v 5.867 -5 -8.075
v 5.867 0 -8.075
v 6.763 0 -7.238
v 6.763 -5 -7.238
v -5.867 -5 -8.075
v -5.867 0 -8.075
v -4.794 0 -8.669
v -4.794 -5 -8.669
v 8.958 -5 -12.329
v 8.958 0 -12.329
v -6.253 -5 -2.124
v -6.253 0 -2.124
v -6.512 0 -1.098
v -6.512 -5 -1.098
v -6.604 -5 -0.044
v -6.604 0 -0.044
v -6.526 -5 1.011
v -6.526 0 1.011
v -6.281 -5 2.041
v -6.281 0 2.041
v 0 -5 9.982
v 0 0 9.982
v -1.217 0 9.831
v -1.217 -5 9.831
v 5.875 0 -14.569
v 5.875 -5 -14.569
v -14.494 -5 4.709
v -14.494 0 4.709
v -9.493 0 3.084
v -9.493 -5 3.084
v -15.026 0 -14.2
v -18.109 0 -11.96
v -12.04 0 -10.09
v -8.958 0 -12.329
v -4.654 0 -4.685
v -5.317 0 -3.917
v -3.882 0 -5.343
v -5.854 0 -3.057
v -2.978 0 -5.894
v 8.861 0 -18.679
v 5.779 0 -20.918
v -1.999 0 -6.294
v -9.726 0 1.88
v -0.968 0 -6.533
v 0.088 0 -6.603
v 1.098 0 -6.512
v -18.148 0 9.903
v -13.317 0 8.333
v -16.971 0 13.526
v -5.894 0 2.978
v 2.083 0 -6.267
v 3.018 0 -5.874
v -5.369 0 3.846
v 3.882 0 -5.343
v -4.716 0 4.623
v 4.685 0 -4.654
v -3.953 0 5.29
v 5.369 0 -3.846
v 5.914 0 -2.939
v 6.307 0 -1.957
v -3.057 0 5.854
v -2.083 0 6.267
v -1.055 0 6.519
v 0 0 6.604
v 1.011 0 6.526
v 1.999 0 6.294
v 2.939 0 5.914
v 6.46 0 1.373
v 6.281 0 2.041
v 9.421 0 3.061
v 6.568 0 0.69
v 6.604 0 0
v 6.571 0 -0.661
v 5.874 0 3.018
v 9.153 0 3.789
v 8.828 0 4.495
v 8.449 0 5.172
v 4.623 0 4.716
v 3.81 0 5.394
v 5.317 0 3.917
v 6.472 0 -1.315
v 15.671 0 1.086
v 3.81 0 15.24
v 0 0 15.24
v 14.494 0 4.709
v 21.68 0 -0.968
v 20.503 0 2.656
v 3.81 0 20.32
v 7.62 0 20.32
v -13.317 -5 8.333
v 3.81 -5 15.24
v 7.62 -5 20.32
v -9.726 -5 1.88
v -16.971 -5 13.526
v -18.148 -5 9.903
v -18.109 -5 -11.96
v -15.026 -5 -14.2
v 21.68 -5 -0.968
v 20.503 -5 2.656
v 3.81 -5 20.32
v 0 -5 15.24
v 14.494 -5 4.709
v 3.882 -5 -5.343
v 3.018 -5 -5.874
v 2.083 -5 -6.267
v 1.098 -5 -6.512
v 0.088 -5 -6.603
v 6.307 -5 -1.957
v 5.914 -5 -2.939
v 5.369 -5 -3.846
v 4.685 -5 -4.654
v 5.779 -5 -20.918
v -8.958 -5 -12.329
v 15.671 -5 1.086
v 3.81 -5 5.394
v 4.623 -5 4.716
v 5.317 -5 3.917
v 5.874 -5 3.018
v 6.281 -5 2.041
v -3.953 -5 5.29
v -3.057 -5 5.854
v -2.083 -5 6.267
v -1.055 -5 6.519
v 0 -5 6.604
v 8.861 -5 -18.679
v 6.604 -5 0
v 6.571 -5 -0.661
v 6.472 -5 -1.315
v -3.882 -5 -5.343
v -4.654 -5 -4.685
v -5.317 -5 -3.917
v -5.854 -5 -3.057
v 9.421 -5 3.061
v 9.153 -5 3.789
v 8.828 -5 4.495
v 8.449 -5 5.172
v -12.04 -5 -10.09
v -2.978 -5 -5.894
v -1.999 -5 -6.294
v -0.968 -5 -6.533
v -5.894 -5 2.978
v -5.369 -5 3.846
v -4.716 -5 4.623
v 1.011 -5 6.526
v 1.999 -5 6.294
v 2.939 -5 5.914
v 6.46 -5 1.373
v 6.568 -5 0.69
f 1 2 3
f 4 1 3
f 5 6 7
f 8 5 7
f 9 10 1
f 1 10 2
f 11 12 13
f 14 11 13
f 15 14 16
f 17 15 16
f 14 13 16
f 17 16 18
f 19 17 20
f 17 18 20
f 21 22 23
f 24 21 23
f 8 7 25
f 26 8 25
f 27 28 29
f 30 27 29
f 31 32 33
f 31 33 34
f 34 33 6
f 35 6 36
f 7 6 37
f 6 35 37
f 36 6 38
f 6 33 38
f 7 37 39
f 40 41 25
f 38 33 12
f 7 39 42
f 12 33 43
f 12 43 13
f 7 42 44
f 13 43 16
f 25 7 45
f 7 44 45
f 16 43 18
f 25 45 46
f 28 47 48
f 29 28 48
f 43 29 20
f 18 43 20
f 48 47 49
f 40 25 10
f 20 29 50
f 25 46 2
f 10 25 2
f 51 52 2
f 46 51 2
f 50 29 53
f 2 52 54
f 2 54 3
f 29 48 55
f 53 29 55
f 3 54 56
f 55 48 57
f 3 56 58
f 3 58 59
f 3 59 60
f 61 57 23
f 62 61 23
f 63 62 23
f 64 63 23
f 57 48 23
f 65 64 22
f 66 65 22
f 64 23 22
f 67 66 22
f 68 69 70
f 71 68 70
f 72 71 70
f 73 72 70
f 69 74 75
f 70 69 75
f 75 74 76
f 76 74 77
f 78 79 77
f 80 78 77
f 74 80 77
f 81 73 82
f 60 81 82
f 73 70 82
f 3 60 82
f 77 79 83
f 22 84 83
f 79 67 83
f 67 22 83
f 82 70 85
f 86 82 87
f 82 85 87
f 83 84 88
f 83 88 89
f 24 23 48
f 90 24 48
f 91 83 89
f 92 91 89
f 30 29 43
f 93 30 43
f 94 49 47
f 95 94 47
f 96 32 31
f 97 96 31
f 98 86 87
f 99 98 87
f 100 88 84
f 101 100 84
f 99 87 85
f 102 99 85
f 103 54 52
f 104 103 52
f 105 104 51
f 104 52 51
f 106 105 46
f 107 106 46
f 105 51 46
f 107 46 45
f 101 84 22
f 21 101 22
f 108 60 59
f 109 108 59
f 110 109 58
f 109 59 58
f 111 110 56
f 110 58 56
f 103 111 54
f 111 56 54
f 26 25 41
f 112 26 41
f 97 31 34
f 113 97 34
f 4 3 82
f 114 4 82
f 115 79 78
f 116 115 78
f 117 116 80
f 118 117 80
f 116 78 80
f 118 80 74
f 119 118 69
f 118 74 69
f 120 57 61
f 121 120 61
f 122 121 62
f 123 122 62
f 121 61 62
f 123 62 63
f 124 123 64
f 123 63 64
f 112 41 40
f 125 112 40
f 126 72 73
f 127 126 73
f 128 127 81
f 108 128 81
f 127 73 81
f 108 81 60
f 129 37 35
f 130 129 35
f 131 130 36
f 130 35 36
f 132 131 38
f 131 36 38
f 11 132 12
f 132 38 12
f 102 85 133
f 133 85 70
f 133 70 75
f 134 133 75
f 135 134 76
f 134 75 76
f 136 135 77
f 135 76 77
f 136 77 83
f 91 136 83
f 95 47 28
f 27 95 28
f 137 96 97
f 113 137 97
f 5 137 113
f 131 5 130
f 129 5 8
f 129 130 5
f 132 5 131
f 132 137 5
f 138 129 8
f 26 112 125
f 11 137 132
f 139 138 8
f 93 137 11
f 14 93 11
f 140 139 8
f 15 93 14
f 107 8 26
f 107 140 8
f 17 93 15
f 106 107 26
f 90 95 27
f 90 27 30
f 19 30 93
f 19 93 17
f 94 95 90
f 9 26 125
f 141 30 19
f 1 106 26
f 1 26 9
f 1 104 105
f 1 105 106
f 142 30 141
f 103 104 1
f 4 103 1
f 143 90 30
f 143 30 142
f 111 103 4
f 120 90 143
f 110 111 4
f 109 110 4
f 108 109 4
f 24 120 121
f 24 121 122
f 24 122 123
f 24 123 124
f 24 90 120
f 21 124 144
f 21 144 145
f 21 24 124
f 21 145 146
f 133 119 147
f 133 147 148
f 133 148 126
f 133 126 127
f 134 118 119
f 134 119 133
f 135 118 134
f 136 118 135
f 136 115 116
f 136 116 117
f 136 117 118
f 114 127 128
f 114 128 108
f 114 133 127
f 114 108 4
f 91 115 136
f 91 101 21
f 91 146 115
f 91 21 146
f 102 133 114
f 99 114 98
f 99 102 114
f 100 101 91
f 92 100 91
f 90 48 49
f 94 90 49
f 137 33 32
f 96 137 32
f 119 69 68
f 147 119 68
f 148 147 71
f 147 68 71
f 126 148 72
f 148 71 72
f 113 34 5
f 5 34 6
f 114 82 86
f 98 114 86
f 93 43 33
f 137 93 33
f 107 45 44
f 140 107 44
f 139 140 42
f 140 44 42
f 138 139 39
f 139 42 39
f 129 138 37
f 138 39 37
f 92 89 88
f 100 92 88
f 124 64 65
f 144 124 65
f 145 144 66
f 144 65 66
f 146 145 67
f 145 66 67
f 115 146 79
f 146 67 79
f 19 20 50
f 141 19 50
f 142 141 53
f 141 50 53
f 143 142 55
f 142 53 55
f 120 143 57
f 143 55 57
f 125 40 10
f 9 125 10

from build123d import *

# Parameters (mm, degrees)
F1_DEPTH = 5


with BuildPart() as f1:
    # F0 (on Front) → F1 (new body)
    with BuildSketch(Plane.XZ):
        with BuildLine():
            ThreePointArc((6.2807772336, 2.0407482309), (6.5226938013, 1.0330932071), (6.604, 0))
            ThreePointArc((6.604, 0), (6.5294502373, -0.9894925964), (6.3074840707, -1.9566452661))
            Line((6.3074840707, -1.9566452661), (9.8738155336, -0.7978739305))
            ThreePointArc((9.8738155336, -0.7978739305), (9.897950613, -0.3992613959), (9.906, 0))
            ThreePointArc((9.906, 0), (9.7840407019, 1.5496398107), (9.4211658504, 3.0611223463))
            Line((9.4211658504, 3.0611223463), (6.2807772336, 2.0407482309))
        make_face()
        with BuildLine():
            ThreePointArc((3.81, 5.3941371877), (5.3166954651, 3.9173416154), (6.2807772336, 2.0407482309))
            Line((6.2807772336, 2.0407482309), (9.4211658504, 3.0611223463))
            Line((9.4211658504, 3.0611223463), (8.4486177468, 5.1720106505))
            ThreePointArc((8.4486177468, 5.1720106505), (6.4430274028, 7.5243759799), (3.81, 9.144))
            Line((3.81, 9.144), (3.81, 5.3941371877))
        make_face()
        with BuildLine():
            Line((9.8738155336, -0.7978739305), (6.3074840707, -1.9566452661))
            ThreePointArc((6.3074840707, -1.9566452661), (5.3685625225, -3.8459527353), (3.8817338061, -5.3427482309))
            Line((3.8817338061, -5.3427482309), (5.8226007092, -8.0141223463))
            ThreePointArc((5.8226007092, -8.0141223463), (6.3048332162, -7.6405440981), (6.763157516, -7.2379925679))
            ThreePointArc((6.763157516, -7.2379925679), (8.9199775829, -4.3084609689), (9.8738155336, -0.7978739305))
        make_face()
        with BuildLine():
            Line((14.4941013083, 4.7094189943), (9.4211658504, 3.0611223463))
            ThreePointArc((9.4211658504, 3.0611223463), (9.7840407019, 1.5496398107), (9.906, 0))
            ThreePointArc((9.906, 0), (9.897950613, -0.3992613959), (9.8738155336, -0.7978739305))
            Line((9.8738155336, -0.7978739305), (15.6714560569, 1.0858936672))
            Line((15.6714560569, 1.0858936672), (14.4941013083, 4.7094189943))
        make_face()
        with BuildLine():
            Line((8.4486177468, 5.1720106505), (9.4211658504, 3.0611223463))
            ThreePointArc((9.4211658504, 3.0611223463), (8.9970136051, 4.1451878352), (8.4486177468, 5.1720106505))
        make_face()
        with BuildLine():
            Line((15.6714560569, 1.0858936672), (9.8738155336, -0.7978739305))
            ThreePointArc((9.8738155336, -0.7978739305), (8.9199775829, -4.3084609689), (6.763157516, -7.2379925679))
            Line((6.763157516, -7.2379925679), (15.6714560569, 1.0858936672))
        make_face()
        with BuildLine():
            ThreePointArc((-3.9527745736, 5.2904053881), (-2.0826640172, 6.2670029992), (0, 6.604))
            Line((0, 6.604), (0, 9.906))
            ThreePointArc((0, 9.906), (-0.6097179629, 9.8872180114), (-1.2171238492, 9.8309432679))
            ThreePointArc((-1.2171238492, 9.8309432679), (-4.6839635346, 8.7286494721), (-7.5191060364, 6.4491767236))
            Line((-7.5191060364, 6.4491767236), (-3.9527745736, 5.2904053881))
        make_face()
        with BuildLine():
            Line((3.81, 15.24), (3.81, 9.144))
            ThreePointArc((3.81, 9.144), (6.4430274028, 7.5243759799), (8.4486177468, 5.1720106505))
            Line((8.4486177468, 5.1720106505), (3.81, 15.24))
        make_face()
        with BuildLine():
            ThreePointArc((0, 9.906), (1.9427264347, 9.7136321734), (3.81, 9.144))
            Line((3.81, 9.144), (3.81, 15.24))
            Line((3.81, 15.24), (0, 15.24))
            Line((0, 15.24), (0, 9.9816298047))
            Line((0, 9.9816298047), (0, 9.906))
        make_face()
        Polygon((20.5028231597, 2.6556999986), (14.4941013083, 4.7094189943), (15.6714560569, 1.0858936672), (21.6801779083, -0.9678253285), align=None)
        with BuildLine():
            Line((2.2923535984, -9.6371132078), (0.0882395392, -6.6034104661))
            ThreePointArc((0.0882395392, -6.6034104661), (-1.9987413555, -6.2942711249), (-3.8817338061, -5.3427482309))
            Line((-3.8817338061, -5.3427482309), (-5.8226007092, -8.0141223463))
            ThreePointArc((-5.8226007092, -8.0141223463), (-5.3182886736, -8.3573106669), (-4.793809454, -8.6688076988))
            ThreePointArc((-4.793809454, -8.6688076988), (-1.3411652542, -9.8147904593), (2.2923535984, -9.6371132078))
        make_face()
        with BuildLine():
            Line((5.8670547931, -8.0753081436), (5.8226007092, -8.0141223463))
            ThreePointArc((5.8226007092, -8.0141223463), (4.1378310366, -9.0003994529), (2.2923535984, -9.6371132078))
            Line((2.2923535984, -9.6371132078), (5.8754924964, -14.5688808055))
            Line((5.8754924964, -14.5688808055), (8.9578472449, -12.3294189943))
            Line((8.9578472449, -12.3294189943), (5.8670547931, -8.0753081436))
        make_face()
        with BuildLine():
            ThreePointArc((6.763157516, -7.2379925679), (6.3048332162, -7.6405440981), (5.8226007092, -8.0141223463))
            Line((5.8226007092, -8.0141223463), (5.8670547931, -8.0753081436))
            Line((5.8670547931, -8.0753081436), (6.763157516, -7.2379925679))
        make_face()
        with BuildLine():
            ThreePointArc((-1.2171238492, 9.8309432679), (-0.6097179629, 9.8872180114), (0, 9.906))
            Line((0, 9.906), (0, 9.9816298047))
            Line((0, 9.9816298047), (-1.2171238492, 9.8309432679))
        make_face()
        Polygon((3.81, 20.32), (3.81, 15.24), (7.62, 20.32), align=None)
        Polygon((0, 15.24), (3.81, 15.24), (3.81, 20.32), align=None)
        with BuildLine():
            Line((5.8754924964, -14.5688808055), (2.2923535984, -9.6371132078))
            ThreePointArc((2.2923535984, -9.6371132078), (-1.3411652542, -9.8147904593), (-4.793809454, -8.6688076988))
            Line((-4.793809454, -8.6688076988), (5.8754924964, -14.5688808055))
        make_face()
        with BuildLine():
            ThreePointArc((-6.2529490364, -2.1244868436), (-6.6038526149, -0.0441207543), (-6.2807772336, 2.0407482309))
            Line((-6.2807772336, 2.0407482309), (-9.4211658504, 3.0611223463))
            ThreePointArc((-9.4211658504, 3.0611223463), (-9.5917163846, 2.47544194), (-9.7258946926, 1.8803745449))
            ThreePointArc((-9.7258946926, 1.8803745449), (-9.7488632535, -1.7574132312), (-8.4570630955, -5.1581895853))
            Line((-8.4570630955, -5.1581895853), (-6.2529490364, -2.1244868436))
        make_face()
        with BuildLine():
            Line((-13.3167465598, 8.3329443214), (-7.5191060364, 6.4491767236))
            ThreePointArc((-7.5191060364, 6.4491767236), (-4.6839635346, 8.7286494721), (-1.2171238492, 9.8309432679))
            Line((-1.2171238492, 9.8309432679), (-13.3167465598, 8.3329443214))
        make_face()
        with BuildLine():
            ThreePointArc((-9.4211658504, 3.0611223463), (-8.6378776917, 4.8493200538), (-7.5191060364, 6.4491767236))
            Line((-7.5191060364, 6.4491767236), (-13.3167465598, 8.3329443214))
            Line((-13.3167465598, 8.3329443214), (-14.4941013083, 4.7094189943))
            Line((-14.4941013083, 4.7094189943), (-9.493094069, 3.0844932412))
            Line((-9.493094069, 3.0844932412), (-9.4211658504, 3.0611223463))
        make_face()
        with BuildLine():
            Line((-5.8670547931, -8.0753081436), (-5.8226007092, -8.0141223463))
            ThreePointArc((-5.8226007092, -8.0141223463), (-7.2812284388, -6.7165875578), (-8.4570630955, -5.1581895853))
            Line((-8.4570630955, -5.1581895853), (-12.0402019935, -10.089957183))
            Line((-12.0402019935, -10.089957183), (-8.9578472449, -12.3294189943))
            Line((-8.9578472449, -12.3294189943), (-5.8670547931, -8.0753081436))
        make_face()
        with BuildLine():
            ThreePointArc((-4.793809454, -8.6688076988), (-5.3182886736, -8.3573106669), (-5.8226007092, -8.0141223463))
            Line((-5.8226007092, -8.0141223463), (-5.8670547931, -8.0753081436))
            Line((-5.8670547931, -8.0753081436), (-4.793809454, -8.6688076988))
        make_face()
        Polygon((8.9578472449, -12.3294189943), (5.8754924964, -14.5688808055), (5.7790868294, -20.9181489482), (8.861441578, -18.6786871369), align=None)
        with BuildLine():
            ThreePointArc((-9.7258946926, 1.8803745449), (-9.5917163846, 2.47544194), (-9.4211658504, 3.0611223463))
            Line((-9.4211658504, 3.0611223463), (-9.493094069, 3.0844932412))
            Line((-9.493094069, 3.0844932412), (-9.7258946926, 1.8803745449))
        make_face()
        Polygon((-14.4941013083, 4.7094189943), (-13.3167465598, 8.3329443214), (-16.970758914, 13.5262759799), (-18.1481136625, 9.9027506528), align=None)
        with BuildLine():
            Line((-12.0402019935, -10.089957183), (-8.4570630955, -5.1581895853))
            ThreePointArc((-8.4570630955, -5.1581895853), (-9.7488632535, -1.7574132312), (-9.7258946926, 1.8803745449))
            Line((-9.7258946926, 1.8803745449), (-12.0402019935, -10.089957183))
        make_face()
        Polygon((-8.9578472449, -12.3294189943), (-12.0402019935, -10.089957183), (-18.1085058237, -11.9603017032), (-15.0261510752, -14.1997635145), align=None)
        with BuildLine():
            Line((-5.8226007092, -8.0141223463), (-3.8817338061, -5.3427482309))
            ThreePointArc((-3.8817338061, -5.3427482309), (-5.3166954651, -3.9173416154), (-6.2529490364, -2.1244868436))
            Line((-6.2529490364, -2.1244868436), (-8.4570630955, -5.1581895853))
            ThreePointArc((-8.4570630955, -5.1581895853), (-7.2812284388, -6.7165875578), (-5.8226007092, -8.0141223463))
        make_face()
        with BuildLine():
            Line((5.8226007092, -8.0141223463), (3.8817338061, -5.3427482309))
            ThreePointArc((3.8817338061, -5.3427482309), (2.0826640172, -6.2670029992), (0.0882395392, -6.6034104661))
            Line((0.0882395392, -6.6034104661), (2.2923535984, -9.6371132078))
            ThreePointArc((2.2923535984, -9.6371132078), (4.1378310366, -9.0003994529), (5.8226007092, -8.0141223463))
        make_face()
        with BuildLine():
            ThreePointArc((-6.2807772336, 2.0407482309), (-5.3685625225, 3.8459527353), (-3.9527745736, 5.2904053881))
            Line((-3.9527745736, 5.2904053881), (-7.5191060364, 6.4491767236))
            ThreePointArc((-7.5191060364, 6.4491767236), (-8.6378776917, 4.8493200538), (-9.4211658504, 3.0611223463))
            Line((-9.4211658504, 3.0611223463), (-6.2807772336, 2.0407482309))
        make_face()
        with BuildLine():
            ThreePointArc((0, 6.604), (1.9987413555, 6.2942711249), (3.81, 5.3941371877))
            Line((3.81, 5.3941371877), (3.81, 9.144))
            ThreePointArc((3.81, 9.144), (1.9427264347, 9.7136321734), (0, 9.906))
            Line((0, 9.906), (0, 6.604))
        make_face()
    extrude(amount=F1_DEPTH)


solid = f1.part
